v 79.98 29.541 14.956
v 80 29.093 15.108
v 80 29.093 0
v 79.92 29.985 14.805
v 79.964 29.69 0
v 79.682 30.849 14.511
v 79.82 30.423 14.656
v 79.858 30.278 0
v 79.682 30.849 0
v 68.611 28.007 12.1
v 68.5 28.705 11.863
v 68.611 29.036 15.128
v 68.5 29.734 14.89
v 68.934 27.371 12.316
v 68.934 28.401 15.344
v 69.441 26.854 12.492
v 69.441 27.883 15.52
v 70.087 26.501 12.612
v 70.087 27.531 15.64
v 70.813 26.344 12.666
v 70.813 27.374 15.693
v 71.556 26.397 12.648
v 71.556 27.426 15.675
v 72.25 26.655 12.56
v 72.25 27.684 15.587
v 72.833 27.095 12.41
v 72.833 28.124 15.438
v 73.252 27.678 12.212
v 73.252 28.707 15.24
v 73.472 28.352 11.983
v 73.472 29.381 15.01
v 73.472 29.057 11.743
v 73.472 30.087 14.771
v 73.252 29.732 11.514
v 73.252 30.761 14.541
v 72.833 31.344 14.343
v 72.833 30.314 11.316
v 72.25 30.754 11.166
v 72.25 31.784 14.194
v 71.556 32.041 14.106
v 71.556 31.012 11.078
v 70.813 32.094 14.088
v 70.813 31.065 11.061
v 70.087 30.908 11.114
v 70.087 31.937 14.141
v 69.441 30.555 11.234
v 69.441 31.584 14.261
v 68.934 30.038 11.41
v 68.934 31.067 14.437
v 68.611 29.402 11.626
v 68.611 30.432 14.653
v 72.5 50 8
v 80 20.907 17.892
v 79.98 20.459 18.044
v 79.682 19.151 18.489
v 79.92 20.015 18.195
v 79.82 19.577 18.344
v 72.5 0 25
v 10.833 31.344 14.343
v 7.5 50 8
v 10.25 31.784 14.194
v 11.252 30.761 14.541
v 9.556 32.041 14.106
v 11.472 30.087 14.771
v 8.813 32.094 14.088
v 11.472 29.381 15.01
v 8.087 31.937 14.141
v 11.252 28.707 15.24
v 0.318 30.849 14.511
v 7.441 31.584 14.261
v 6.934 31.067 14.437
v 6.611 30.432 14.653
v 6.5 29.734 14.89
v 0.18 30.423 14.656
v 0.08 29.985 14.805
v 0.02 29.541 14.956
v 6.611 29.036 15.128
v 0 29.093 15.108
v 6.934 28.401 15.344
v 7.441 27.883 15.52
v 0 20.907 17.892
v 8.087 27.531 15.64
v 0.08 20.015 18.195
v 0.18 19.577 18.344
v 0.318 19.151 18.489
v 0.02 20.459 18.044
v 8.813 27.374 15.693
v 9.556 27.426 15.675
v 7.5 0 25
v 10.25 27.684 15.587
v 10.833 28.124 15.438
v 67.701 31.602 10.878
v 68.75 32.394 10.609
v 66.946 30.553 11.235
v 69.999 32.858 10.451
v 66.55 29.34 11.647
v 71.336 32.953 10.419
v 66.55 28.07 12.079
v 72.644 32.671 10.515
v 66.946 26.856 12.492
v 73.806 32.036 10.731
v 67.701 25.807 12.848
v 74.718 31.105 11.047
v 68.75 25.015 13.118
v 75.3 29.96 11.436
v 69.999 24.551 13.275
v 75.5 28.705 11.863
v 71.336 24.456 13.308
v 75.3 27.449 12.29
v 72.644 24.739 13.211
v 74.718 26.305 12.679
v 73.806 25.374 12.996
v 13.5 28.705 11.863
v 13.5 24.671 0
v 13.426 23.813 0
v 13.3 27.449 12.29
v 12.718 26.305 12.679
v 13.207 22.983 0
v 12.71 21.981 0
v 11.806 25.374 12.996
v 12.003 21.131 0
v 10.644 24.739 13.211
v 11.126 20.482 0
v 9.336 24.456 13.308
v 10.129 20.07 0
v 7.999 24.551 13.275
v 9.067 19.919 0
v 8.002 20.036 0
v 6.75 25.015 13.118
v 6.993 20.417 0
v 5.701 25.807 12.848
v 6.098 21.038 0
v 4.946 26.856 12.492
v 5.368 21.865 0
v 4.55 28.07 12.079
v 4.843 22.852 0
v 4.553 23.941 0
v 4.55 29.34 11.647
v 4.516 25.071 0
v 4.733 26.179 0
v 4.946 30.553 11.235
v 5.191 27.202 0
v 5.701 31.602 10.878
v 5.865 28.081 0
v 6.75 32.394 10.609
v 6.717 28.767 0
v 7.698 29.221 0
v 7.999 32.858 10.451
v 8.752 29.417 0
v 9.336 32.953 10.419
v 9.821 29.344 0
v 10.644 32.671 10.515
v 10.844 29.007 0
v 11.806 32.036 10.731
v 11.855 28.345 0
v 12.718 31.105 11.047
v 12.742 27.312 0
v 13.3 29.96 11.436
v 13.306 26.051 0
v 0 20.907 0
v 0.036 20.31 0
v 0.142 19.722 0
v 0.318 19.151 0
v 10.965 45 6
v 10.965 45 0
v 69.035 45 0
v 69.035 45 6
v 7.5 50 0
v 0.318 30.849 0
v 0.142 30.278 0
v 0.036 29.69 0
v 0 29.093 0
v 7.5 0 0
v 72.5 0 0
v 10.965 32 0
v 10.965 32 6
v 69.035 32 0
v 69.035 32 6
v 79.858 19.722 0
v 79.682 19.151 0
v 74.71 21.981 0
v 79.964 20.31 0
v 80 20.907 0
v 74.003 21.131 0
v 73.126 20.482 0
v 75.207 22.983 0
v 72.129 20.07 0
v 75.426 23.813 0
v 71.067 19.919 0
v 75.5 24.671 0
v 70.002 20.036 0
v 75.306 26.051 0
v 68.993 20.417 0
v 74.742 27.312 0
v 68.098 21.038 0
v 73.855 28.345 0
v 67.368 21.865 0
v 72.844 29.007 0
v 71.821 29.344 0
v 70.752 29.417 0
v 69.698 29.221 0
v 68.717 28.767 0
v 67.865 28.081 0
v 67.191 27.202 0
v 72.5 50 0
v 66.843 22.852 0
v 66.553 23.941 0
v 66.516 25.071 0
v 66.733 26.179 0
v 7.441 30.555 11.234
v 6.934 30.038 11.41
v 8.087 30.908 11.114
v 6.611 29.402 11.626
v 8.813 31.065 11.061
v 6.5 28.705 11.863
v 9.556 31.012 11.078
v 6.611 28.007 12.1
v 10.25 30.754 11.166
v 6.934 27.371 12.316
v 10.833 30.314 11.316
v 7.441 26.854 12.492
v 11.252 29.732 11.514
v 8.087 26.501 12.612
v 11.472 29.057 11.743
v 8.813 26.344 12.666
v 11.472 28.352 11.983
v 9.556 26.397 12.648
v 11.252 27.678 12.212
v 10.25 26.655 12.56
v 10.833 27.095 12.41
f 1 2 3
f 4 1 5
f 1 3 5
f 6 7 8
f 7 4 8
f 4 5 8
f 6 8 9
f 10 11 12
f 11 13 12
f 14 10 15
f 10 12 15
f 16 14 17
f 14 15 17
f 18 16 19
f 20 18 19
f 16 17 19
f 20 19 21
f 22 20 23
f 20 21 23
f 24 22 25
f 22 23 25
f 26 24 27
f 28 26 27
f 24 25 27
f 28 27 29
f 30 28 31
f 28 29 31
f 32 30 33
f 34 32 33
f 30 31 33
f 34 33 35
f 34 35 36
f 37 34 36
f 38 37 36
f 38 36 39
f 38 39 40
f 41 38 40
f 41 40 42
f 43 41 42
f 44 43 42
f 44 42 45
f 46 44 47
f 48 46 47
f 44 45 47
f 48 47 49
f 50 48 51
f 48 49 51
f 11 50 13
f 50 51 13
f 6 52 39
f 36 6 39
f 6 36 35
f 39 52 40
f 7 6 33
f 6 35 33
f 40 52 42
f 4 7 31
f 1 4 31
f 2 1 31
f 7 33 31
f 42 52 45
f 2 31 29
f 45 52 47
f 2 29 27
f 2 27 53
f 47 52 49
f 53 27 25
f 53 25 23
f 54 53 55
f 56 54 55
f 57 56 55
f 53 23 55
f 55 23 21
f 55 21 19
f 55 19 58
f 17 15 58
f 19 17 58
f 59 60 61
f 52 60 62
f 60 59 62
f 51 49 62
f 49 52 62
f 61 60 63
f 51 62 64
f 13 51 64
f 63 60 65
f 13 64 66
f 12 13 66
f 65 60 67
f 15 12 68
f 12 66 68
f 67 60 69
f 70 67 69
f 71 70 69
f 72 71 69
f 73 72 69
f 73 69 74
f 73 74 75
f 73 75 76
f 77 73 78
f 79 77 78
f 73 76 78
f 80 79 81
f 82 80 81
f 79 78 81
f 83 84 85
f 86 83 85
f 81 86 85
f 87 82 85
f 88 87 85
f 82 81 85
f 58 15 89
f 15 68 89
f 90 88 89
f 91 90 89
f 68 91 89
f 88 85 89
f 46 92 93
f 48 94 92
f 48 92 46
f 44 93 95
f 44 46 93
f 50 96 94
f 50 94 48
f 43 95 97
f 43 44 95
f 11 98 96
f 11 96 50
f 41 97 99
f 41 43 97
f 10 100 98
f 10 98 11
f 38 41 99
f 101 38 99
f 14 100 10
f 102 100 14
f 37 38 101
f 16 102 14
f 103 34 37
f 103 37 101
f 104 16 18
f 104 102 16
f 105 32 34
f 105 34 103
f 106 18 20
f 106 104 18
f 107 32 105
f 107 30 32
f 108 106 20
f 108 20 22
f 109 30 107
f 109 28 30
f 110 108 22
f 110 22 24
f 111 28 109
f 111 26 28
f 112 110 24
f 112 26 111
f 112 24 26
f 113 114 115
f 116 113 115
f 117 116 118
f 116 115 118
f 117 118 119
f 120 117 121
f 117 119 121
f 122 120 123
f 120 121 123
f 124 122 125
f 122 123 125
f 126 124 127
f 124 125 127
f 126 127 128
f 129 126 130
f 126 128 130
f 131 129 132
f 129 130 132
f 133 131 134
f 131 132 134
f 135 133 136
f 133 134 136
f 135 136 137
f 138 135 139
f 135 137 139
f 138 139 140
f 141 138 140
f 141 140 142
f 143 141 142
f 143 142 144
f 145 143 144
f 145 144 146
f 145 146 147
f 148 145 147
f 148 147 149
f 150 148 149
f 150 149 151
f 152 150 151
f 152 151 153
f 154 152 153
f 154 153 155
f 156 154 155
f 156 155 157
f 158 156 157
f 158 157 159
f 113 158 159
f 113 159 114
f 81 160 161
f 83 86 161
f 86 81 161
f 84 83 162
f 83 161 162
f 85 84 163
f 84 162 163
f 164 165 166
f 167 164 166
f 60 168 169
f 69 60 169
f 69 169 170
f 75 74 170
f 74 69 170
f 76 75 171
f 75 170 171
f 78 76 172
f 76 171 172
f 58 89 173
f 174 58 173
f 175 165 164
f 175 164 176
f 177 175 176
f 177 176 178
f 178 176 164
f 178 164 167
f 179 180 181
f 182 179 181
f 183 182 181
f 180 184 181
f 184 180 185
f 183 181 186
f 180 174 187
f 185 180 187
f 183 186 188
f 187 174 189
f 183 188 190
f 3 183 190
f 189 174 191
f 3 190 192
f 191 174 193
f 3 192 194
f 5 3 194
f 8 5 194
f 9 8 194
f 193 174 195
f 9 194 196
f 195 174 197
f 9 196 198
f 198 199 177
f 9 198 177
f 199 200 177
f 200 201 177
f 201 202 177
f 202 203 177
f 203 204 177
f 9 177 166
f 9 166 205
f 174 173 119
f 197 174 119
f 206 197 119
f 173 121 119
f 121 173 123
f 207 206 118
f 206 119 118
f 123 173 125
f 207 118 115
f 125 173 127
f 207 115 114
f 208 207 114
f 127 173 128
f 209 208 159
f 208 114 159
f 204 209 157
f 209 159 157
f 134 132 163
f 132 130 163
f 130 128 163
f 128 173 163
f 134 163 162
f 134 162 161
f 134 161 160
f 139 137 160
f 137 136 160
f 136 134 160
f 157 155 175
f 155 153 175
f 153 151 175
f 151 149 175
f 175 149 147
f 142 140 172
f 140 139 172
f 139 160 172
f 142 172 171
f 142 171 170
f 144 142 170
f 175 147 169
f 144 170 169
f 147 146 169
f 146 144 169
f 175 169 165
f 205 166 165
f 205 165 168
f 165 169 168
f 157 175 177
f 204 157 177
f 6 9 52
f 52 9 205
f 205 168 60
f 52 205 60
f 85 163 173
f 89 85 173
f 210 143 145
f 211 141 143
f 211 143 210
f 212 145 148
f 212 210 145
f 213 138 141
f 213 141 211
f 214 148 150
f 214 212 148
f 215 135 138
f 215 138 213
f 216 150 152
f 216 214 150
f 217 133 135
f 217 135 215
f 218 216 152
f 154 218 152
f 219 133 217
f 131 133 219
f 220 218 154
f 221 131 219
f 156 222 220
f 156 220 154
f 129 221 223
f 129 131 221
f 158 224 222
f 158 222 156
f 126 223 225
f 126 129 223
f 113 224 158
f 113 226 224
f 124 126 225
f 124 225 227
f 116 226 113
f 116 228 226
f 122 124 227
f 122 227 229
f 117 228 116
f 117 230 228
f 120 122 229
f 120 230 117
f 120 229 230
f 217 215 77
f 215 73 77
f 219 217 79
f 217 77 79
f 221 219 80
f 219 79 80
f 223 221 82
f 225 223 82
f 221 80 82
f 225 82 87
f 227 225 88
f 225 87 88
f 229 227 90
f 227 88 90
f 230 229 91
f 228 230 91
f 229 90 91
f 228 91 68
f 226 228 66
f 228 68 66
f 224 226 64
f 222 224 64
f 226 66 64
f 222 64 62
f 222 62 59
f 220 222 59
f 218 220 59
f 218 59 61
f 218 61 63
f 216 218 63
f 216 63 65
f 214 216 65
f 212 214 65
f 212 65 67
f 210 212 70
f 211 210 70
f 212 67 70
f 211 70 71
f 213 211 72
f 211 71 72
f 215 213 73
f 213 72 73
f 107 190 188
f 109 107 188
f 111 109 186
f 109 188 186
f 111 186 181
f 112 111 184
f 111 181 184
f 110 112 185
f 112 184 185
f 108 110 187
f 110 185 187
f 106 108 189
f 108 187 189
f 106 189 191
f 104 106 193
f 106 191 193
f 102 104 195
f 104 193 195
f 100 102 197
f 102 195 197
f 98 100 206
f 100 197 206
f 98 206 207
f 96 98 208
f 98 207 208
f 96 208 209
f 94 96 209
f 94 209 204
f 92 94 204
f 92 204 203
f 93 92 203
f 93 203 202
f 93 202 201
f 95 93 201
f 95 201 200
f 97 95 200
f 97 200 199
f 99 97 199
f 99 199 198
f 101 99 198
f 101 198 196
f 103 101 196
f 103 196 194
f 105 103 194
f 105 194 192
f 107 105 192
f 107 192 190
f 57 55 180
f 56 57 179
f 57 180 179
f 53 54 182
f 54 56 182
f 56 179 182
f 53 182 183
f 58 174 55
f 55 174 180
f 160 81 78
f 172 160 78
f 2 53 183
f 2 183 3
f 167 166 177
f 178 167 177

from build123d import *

# Parameters (mm, degrees)
F1_DEPTH       = 80
F3_DEPTH       = 25
F6_D           = 5
F6_START       = 3.8023749
F6_CBORE_D     = 9
F6_CBORE_DEPTH = 11
F7_W           = 58.0699953184
F7_H           = 13
F8_DEPTH       = 6


with BuildPart() as f1:
    # F0 (on Right) → F1 (new body)
    with BuildSketch(Plane.YZ):
        Polygon((0, 25), (0, 0), (50, 0), (50, 8), align=None)
    extrude(amount=F1_DEPTH)

    # F2 (on face) → F3 (cut)
    with BuildSketch(Plane(origin=(0, 0, 0), x_dir=(1, 0, 0), z_dir=(0, 0, -1))):
        with BuildLine():
            Line((0.3183541251, -19.1510552385), (7.5, 0))
            Line((7.5, 0), (0, 0))
            Line((0, 0), (0, -20.9066724808))
            ThreePointArc((0, -20.9066724808), (0.0802322527, -20.0145484353), (0.3183541251, -19.1510552385))
        make_face()
        with BuildLine():
            ThreePointArc((0.3183541122, -30.8489442991), (0.0802322494, -29.9854511186), (0, -29.0933270912))
            Line((0, -29.0933270912), (0, -50))
            Line((0, -50), (7.5, -50))
            Line((7.5, -50), (0.3183541122, -30.8489442991))
        make_face()
        with BuildLine():
            Line((80, -50), (80, -29.0933270912))
            ThreePointArc((80, -29.0933270912), (79.9197677506, -29.9854511186), (79.6816458878, -30.8489442991))
            Line((79.6816458878, -30.8489442991), (72.5, -50))
            Line((72.5, -50), (80, -50))
        make_face()
        with BuildLine():
            Line((80, 0), (72.5, 0))
            Line((72.5, 0), (79.6816458749, -19.1510552385))
            ThreePointArc((79.6816458749, -19.1510552385), (79.9197677473, -20.0145484353), (80, -20.9066724808))
            Line((80, -20.9066724808), (80, 0))
        make_face()
    extrude(amount=-F3_DEPTH, mode=Mode.SUBTRACT)

    # F6 (through all)
    # its depths count from where the whole tool has entered the part; down to there all is cleared
    with Locations(Plane(origin=(0, 1.8249691595, 5.3675563516), x_dir=(1, 0, 0), z_dir=(0, -0.3219027332, -0.9467727448)).offset(-F6_START)):
        with Locations((71, -23.3579222113), (9, -23.3579222113)):
            CounterBoreHole(F6_D / 2, F6_CBORE_D / 2, F6_CBORE_DEPTH)

    # F7 (on face) → F8 (cut)
    with BuildSketch(Plane(origin=(0, 0, 0), x_dir=(1, 0, 0), z_dir=(0, 0, -1))):
        with Locations((40, -38.5)):
            Rectangle(F7_W, F7_H)
    extrude(amount=-F8_DEPTH, mode=Mode.SUBTRACT)


solid = f1.part
